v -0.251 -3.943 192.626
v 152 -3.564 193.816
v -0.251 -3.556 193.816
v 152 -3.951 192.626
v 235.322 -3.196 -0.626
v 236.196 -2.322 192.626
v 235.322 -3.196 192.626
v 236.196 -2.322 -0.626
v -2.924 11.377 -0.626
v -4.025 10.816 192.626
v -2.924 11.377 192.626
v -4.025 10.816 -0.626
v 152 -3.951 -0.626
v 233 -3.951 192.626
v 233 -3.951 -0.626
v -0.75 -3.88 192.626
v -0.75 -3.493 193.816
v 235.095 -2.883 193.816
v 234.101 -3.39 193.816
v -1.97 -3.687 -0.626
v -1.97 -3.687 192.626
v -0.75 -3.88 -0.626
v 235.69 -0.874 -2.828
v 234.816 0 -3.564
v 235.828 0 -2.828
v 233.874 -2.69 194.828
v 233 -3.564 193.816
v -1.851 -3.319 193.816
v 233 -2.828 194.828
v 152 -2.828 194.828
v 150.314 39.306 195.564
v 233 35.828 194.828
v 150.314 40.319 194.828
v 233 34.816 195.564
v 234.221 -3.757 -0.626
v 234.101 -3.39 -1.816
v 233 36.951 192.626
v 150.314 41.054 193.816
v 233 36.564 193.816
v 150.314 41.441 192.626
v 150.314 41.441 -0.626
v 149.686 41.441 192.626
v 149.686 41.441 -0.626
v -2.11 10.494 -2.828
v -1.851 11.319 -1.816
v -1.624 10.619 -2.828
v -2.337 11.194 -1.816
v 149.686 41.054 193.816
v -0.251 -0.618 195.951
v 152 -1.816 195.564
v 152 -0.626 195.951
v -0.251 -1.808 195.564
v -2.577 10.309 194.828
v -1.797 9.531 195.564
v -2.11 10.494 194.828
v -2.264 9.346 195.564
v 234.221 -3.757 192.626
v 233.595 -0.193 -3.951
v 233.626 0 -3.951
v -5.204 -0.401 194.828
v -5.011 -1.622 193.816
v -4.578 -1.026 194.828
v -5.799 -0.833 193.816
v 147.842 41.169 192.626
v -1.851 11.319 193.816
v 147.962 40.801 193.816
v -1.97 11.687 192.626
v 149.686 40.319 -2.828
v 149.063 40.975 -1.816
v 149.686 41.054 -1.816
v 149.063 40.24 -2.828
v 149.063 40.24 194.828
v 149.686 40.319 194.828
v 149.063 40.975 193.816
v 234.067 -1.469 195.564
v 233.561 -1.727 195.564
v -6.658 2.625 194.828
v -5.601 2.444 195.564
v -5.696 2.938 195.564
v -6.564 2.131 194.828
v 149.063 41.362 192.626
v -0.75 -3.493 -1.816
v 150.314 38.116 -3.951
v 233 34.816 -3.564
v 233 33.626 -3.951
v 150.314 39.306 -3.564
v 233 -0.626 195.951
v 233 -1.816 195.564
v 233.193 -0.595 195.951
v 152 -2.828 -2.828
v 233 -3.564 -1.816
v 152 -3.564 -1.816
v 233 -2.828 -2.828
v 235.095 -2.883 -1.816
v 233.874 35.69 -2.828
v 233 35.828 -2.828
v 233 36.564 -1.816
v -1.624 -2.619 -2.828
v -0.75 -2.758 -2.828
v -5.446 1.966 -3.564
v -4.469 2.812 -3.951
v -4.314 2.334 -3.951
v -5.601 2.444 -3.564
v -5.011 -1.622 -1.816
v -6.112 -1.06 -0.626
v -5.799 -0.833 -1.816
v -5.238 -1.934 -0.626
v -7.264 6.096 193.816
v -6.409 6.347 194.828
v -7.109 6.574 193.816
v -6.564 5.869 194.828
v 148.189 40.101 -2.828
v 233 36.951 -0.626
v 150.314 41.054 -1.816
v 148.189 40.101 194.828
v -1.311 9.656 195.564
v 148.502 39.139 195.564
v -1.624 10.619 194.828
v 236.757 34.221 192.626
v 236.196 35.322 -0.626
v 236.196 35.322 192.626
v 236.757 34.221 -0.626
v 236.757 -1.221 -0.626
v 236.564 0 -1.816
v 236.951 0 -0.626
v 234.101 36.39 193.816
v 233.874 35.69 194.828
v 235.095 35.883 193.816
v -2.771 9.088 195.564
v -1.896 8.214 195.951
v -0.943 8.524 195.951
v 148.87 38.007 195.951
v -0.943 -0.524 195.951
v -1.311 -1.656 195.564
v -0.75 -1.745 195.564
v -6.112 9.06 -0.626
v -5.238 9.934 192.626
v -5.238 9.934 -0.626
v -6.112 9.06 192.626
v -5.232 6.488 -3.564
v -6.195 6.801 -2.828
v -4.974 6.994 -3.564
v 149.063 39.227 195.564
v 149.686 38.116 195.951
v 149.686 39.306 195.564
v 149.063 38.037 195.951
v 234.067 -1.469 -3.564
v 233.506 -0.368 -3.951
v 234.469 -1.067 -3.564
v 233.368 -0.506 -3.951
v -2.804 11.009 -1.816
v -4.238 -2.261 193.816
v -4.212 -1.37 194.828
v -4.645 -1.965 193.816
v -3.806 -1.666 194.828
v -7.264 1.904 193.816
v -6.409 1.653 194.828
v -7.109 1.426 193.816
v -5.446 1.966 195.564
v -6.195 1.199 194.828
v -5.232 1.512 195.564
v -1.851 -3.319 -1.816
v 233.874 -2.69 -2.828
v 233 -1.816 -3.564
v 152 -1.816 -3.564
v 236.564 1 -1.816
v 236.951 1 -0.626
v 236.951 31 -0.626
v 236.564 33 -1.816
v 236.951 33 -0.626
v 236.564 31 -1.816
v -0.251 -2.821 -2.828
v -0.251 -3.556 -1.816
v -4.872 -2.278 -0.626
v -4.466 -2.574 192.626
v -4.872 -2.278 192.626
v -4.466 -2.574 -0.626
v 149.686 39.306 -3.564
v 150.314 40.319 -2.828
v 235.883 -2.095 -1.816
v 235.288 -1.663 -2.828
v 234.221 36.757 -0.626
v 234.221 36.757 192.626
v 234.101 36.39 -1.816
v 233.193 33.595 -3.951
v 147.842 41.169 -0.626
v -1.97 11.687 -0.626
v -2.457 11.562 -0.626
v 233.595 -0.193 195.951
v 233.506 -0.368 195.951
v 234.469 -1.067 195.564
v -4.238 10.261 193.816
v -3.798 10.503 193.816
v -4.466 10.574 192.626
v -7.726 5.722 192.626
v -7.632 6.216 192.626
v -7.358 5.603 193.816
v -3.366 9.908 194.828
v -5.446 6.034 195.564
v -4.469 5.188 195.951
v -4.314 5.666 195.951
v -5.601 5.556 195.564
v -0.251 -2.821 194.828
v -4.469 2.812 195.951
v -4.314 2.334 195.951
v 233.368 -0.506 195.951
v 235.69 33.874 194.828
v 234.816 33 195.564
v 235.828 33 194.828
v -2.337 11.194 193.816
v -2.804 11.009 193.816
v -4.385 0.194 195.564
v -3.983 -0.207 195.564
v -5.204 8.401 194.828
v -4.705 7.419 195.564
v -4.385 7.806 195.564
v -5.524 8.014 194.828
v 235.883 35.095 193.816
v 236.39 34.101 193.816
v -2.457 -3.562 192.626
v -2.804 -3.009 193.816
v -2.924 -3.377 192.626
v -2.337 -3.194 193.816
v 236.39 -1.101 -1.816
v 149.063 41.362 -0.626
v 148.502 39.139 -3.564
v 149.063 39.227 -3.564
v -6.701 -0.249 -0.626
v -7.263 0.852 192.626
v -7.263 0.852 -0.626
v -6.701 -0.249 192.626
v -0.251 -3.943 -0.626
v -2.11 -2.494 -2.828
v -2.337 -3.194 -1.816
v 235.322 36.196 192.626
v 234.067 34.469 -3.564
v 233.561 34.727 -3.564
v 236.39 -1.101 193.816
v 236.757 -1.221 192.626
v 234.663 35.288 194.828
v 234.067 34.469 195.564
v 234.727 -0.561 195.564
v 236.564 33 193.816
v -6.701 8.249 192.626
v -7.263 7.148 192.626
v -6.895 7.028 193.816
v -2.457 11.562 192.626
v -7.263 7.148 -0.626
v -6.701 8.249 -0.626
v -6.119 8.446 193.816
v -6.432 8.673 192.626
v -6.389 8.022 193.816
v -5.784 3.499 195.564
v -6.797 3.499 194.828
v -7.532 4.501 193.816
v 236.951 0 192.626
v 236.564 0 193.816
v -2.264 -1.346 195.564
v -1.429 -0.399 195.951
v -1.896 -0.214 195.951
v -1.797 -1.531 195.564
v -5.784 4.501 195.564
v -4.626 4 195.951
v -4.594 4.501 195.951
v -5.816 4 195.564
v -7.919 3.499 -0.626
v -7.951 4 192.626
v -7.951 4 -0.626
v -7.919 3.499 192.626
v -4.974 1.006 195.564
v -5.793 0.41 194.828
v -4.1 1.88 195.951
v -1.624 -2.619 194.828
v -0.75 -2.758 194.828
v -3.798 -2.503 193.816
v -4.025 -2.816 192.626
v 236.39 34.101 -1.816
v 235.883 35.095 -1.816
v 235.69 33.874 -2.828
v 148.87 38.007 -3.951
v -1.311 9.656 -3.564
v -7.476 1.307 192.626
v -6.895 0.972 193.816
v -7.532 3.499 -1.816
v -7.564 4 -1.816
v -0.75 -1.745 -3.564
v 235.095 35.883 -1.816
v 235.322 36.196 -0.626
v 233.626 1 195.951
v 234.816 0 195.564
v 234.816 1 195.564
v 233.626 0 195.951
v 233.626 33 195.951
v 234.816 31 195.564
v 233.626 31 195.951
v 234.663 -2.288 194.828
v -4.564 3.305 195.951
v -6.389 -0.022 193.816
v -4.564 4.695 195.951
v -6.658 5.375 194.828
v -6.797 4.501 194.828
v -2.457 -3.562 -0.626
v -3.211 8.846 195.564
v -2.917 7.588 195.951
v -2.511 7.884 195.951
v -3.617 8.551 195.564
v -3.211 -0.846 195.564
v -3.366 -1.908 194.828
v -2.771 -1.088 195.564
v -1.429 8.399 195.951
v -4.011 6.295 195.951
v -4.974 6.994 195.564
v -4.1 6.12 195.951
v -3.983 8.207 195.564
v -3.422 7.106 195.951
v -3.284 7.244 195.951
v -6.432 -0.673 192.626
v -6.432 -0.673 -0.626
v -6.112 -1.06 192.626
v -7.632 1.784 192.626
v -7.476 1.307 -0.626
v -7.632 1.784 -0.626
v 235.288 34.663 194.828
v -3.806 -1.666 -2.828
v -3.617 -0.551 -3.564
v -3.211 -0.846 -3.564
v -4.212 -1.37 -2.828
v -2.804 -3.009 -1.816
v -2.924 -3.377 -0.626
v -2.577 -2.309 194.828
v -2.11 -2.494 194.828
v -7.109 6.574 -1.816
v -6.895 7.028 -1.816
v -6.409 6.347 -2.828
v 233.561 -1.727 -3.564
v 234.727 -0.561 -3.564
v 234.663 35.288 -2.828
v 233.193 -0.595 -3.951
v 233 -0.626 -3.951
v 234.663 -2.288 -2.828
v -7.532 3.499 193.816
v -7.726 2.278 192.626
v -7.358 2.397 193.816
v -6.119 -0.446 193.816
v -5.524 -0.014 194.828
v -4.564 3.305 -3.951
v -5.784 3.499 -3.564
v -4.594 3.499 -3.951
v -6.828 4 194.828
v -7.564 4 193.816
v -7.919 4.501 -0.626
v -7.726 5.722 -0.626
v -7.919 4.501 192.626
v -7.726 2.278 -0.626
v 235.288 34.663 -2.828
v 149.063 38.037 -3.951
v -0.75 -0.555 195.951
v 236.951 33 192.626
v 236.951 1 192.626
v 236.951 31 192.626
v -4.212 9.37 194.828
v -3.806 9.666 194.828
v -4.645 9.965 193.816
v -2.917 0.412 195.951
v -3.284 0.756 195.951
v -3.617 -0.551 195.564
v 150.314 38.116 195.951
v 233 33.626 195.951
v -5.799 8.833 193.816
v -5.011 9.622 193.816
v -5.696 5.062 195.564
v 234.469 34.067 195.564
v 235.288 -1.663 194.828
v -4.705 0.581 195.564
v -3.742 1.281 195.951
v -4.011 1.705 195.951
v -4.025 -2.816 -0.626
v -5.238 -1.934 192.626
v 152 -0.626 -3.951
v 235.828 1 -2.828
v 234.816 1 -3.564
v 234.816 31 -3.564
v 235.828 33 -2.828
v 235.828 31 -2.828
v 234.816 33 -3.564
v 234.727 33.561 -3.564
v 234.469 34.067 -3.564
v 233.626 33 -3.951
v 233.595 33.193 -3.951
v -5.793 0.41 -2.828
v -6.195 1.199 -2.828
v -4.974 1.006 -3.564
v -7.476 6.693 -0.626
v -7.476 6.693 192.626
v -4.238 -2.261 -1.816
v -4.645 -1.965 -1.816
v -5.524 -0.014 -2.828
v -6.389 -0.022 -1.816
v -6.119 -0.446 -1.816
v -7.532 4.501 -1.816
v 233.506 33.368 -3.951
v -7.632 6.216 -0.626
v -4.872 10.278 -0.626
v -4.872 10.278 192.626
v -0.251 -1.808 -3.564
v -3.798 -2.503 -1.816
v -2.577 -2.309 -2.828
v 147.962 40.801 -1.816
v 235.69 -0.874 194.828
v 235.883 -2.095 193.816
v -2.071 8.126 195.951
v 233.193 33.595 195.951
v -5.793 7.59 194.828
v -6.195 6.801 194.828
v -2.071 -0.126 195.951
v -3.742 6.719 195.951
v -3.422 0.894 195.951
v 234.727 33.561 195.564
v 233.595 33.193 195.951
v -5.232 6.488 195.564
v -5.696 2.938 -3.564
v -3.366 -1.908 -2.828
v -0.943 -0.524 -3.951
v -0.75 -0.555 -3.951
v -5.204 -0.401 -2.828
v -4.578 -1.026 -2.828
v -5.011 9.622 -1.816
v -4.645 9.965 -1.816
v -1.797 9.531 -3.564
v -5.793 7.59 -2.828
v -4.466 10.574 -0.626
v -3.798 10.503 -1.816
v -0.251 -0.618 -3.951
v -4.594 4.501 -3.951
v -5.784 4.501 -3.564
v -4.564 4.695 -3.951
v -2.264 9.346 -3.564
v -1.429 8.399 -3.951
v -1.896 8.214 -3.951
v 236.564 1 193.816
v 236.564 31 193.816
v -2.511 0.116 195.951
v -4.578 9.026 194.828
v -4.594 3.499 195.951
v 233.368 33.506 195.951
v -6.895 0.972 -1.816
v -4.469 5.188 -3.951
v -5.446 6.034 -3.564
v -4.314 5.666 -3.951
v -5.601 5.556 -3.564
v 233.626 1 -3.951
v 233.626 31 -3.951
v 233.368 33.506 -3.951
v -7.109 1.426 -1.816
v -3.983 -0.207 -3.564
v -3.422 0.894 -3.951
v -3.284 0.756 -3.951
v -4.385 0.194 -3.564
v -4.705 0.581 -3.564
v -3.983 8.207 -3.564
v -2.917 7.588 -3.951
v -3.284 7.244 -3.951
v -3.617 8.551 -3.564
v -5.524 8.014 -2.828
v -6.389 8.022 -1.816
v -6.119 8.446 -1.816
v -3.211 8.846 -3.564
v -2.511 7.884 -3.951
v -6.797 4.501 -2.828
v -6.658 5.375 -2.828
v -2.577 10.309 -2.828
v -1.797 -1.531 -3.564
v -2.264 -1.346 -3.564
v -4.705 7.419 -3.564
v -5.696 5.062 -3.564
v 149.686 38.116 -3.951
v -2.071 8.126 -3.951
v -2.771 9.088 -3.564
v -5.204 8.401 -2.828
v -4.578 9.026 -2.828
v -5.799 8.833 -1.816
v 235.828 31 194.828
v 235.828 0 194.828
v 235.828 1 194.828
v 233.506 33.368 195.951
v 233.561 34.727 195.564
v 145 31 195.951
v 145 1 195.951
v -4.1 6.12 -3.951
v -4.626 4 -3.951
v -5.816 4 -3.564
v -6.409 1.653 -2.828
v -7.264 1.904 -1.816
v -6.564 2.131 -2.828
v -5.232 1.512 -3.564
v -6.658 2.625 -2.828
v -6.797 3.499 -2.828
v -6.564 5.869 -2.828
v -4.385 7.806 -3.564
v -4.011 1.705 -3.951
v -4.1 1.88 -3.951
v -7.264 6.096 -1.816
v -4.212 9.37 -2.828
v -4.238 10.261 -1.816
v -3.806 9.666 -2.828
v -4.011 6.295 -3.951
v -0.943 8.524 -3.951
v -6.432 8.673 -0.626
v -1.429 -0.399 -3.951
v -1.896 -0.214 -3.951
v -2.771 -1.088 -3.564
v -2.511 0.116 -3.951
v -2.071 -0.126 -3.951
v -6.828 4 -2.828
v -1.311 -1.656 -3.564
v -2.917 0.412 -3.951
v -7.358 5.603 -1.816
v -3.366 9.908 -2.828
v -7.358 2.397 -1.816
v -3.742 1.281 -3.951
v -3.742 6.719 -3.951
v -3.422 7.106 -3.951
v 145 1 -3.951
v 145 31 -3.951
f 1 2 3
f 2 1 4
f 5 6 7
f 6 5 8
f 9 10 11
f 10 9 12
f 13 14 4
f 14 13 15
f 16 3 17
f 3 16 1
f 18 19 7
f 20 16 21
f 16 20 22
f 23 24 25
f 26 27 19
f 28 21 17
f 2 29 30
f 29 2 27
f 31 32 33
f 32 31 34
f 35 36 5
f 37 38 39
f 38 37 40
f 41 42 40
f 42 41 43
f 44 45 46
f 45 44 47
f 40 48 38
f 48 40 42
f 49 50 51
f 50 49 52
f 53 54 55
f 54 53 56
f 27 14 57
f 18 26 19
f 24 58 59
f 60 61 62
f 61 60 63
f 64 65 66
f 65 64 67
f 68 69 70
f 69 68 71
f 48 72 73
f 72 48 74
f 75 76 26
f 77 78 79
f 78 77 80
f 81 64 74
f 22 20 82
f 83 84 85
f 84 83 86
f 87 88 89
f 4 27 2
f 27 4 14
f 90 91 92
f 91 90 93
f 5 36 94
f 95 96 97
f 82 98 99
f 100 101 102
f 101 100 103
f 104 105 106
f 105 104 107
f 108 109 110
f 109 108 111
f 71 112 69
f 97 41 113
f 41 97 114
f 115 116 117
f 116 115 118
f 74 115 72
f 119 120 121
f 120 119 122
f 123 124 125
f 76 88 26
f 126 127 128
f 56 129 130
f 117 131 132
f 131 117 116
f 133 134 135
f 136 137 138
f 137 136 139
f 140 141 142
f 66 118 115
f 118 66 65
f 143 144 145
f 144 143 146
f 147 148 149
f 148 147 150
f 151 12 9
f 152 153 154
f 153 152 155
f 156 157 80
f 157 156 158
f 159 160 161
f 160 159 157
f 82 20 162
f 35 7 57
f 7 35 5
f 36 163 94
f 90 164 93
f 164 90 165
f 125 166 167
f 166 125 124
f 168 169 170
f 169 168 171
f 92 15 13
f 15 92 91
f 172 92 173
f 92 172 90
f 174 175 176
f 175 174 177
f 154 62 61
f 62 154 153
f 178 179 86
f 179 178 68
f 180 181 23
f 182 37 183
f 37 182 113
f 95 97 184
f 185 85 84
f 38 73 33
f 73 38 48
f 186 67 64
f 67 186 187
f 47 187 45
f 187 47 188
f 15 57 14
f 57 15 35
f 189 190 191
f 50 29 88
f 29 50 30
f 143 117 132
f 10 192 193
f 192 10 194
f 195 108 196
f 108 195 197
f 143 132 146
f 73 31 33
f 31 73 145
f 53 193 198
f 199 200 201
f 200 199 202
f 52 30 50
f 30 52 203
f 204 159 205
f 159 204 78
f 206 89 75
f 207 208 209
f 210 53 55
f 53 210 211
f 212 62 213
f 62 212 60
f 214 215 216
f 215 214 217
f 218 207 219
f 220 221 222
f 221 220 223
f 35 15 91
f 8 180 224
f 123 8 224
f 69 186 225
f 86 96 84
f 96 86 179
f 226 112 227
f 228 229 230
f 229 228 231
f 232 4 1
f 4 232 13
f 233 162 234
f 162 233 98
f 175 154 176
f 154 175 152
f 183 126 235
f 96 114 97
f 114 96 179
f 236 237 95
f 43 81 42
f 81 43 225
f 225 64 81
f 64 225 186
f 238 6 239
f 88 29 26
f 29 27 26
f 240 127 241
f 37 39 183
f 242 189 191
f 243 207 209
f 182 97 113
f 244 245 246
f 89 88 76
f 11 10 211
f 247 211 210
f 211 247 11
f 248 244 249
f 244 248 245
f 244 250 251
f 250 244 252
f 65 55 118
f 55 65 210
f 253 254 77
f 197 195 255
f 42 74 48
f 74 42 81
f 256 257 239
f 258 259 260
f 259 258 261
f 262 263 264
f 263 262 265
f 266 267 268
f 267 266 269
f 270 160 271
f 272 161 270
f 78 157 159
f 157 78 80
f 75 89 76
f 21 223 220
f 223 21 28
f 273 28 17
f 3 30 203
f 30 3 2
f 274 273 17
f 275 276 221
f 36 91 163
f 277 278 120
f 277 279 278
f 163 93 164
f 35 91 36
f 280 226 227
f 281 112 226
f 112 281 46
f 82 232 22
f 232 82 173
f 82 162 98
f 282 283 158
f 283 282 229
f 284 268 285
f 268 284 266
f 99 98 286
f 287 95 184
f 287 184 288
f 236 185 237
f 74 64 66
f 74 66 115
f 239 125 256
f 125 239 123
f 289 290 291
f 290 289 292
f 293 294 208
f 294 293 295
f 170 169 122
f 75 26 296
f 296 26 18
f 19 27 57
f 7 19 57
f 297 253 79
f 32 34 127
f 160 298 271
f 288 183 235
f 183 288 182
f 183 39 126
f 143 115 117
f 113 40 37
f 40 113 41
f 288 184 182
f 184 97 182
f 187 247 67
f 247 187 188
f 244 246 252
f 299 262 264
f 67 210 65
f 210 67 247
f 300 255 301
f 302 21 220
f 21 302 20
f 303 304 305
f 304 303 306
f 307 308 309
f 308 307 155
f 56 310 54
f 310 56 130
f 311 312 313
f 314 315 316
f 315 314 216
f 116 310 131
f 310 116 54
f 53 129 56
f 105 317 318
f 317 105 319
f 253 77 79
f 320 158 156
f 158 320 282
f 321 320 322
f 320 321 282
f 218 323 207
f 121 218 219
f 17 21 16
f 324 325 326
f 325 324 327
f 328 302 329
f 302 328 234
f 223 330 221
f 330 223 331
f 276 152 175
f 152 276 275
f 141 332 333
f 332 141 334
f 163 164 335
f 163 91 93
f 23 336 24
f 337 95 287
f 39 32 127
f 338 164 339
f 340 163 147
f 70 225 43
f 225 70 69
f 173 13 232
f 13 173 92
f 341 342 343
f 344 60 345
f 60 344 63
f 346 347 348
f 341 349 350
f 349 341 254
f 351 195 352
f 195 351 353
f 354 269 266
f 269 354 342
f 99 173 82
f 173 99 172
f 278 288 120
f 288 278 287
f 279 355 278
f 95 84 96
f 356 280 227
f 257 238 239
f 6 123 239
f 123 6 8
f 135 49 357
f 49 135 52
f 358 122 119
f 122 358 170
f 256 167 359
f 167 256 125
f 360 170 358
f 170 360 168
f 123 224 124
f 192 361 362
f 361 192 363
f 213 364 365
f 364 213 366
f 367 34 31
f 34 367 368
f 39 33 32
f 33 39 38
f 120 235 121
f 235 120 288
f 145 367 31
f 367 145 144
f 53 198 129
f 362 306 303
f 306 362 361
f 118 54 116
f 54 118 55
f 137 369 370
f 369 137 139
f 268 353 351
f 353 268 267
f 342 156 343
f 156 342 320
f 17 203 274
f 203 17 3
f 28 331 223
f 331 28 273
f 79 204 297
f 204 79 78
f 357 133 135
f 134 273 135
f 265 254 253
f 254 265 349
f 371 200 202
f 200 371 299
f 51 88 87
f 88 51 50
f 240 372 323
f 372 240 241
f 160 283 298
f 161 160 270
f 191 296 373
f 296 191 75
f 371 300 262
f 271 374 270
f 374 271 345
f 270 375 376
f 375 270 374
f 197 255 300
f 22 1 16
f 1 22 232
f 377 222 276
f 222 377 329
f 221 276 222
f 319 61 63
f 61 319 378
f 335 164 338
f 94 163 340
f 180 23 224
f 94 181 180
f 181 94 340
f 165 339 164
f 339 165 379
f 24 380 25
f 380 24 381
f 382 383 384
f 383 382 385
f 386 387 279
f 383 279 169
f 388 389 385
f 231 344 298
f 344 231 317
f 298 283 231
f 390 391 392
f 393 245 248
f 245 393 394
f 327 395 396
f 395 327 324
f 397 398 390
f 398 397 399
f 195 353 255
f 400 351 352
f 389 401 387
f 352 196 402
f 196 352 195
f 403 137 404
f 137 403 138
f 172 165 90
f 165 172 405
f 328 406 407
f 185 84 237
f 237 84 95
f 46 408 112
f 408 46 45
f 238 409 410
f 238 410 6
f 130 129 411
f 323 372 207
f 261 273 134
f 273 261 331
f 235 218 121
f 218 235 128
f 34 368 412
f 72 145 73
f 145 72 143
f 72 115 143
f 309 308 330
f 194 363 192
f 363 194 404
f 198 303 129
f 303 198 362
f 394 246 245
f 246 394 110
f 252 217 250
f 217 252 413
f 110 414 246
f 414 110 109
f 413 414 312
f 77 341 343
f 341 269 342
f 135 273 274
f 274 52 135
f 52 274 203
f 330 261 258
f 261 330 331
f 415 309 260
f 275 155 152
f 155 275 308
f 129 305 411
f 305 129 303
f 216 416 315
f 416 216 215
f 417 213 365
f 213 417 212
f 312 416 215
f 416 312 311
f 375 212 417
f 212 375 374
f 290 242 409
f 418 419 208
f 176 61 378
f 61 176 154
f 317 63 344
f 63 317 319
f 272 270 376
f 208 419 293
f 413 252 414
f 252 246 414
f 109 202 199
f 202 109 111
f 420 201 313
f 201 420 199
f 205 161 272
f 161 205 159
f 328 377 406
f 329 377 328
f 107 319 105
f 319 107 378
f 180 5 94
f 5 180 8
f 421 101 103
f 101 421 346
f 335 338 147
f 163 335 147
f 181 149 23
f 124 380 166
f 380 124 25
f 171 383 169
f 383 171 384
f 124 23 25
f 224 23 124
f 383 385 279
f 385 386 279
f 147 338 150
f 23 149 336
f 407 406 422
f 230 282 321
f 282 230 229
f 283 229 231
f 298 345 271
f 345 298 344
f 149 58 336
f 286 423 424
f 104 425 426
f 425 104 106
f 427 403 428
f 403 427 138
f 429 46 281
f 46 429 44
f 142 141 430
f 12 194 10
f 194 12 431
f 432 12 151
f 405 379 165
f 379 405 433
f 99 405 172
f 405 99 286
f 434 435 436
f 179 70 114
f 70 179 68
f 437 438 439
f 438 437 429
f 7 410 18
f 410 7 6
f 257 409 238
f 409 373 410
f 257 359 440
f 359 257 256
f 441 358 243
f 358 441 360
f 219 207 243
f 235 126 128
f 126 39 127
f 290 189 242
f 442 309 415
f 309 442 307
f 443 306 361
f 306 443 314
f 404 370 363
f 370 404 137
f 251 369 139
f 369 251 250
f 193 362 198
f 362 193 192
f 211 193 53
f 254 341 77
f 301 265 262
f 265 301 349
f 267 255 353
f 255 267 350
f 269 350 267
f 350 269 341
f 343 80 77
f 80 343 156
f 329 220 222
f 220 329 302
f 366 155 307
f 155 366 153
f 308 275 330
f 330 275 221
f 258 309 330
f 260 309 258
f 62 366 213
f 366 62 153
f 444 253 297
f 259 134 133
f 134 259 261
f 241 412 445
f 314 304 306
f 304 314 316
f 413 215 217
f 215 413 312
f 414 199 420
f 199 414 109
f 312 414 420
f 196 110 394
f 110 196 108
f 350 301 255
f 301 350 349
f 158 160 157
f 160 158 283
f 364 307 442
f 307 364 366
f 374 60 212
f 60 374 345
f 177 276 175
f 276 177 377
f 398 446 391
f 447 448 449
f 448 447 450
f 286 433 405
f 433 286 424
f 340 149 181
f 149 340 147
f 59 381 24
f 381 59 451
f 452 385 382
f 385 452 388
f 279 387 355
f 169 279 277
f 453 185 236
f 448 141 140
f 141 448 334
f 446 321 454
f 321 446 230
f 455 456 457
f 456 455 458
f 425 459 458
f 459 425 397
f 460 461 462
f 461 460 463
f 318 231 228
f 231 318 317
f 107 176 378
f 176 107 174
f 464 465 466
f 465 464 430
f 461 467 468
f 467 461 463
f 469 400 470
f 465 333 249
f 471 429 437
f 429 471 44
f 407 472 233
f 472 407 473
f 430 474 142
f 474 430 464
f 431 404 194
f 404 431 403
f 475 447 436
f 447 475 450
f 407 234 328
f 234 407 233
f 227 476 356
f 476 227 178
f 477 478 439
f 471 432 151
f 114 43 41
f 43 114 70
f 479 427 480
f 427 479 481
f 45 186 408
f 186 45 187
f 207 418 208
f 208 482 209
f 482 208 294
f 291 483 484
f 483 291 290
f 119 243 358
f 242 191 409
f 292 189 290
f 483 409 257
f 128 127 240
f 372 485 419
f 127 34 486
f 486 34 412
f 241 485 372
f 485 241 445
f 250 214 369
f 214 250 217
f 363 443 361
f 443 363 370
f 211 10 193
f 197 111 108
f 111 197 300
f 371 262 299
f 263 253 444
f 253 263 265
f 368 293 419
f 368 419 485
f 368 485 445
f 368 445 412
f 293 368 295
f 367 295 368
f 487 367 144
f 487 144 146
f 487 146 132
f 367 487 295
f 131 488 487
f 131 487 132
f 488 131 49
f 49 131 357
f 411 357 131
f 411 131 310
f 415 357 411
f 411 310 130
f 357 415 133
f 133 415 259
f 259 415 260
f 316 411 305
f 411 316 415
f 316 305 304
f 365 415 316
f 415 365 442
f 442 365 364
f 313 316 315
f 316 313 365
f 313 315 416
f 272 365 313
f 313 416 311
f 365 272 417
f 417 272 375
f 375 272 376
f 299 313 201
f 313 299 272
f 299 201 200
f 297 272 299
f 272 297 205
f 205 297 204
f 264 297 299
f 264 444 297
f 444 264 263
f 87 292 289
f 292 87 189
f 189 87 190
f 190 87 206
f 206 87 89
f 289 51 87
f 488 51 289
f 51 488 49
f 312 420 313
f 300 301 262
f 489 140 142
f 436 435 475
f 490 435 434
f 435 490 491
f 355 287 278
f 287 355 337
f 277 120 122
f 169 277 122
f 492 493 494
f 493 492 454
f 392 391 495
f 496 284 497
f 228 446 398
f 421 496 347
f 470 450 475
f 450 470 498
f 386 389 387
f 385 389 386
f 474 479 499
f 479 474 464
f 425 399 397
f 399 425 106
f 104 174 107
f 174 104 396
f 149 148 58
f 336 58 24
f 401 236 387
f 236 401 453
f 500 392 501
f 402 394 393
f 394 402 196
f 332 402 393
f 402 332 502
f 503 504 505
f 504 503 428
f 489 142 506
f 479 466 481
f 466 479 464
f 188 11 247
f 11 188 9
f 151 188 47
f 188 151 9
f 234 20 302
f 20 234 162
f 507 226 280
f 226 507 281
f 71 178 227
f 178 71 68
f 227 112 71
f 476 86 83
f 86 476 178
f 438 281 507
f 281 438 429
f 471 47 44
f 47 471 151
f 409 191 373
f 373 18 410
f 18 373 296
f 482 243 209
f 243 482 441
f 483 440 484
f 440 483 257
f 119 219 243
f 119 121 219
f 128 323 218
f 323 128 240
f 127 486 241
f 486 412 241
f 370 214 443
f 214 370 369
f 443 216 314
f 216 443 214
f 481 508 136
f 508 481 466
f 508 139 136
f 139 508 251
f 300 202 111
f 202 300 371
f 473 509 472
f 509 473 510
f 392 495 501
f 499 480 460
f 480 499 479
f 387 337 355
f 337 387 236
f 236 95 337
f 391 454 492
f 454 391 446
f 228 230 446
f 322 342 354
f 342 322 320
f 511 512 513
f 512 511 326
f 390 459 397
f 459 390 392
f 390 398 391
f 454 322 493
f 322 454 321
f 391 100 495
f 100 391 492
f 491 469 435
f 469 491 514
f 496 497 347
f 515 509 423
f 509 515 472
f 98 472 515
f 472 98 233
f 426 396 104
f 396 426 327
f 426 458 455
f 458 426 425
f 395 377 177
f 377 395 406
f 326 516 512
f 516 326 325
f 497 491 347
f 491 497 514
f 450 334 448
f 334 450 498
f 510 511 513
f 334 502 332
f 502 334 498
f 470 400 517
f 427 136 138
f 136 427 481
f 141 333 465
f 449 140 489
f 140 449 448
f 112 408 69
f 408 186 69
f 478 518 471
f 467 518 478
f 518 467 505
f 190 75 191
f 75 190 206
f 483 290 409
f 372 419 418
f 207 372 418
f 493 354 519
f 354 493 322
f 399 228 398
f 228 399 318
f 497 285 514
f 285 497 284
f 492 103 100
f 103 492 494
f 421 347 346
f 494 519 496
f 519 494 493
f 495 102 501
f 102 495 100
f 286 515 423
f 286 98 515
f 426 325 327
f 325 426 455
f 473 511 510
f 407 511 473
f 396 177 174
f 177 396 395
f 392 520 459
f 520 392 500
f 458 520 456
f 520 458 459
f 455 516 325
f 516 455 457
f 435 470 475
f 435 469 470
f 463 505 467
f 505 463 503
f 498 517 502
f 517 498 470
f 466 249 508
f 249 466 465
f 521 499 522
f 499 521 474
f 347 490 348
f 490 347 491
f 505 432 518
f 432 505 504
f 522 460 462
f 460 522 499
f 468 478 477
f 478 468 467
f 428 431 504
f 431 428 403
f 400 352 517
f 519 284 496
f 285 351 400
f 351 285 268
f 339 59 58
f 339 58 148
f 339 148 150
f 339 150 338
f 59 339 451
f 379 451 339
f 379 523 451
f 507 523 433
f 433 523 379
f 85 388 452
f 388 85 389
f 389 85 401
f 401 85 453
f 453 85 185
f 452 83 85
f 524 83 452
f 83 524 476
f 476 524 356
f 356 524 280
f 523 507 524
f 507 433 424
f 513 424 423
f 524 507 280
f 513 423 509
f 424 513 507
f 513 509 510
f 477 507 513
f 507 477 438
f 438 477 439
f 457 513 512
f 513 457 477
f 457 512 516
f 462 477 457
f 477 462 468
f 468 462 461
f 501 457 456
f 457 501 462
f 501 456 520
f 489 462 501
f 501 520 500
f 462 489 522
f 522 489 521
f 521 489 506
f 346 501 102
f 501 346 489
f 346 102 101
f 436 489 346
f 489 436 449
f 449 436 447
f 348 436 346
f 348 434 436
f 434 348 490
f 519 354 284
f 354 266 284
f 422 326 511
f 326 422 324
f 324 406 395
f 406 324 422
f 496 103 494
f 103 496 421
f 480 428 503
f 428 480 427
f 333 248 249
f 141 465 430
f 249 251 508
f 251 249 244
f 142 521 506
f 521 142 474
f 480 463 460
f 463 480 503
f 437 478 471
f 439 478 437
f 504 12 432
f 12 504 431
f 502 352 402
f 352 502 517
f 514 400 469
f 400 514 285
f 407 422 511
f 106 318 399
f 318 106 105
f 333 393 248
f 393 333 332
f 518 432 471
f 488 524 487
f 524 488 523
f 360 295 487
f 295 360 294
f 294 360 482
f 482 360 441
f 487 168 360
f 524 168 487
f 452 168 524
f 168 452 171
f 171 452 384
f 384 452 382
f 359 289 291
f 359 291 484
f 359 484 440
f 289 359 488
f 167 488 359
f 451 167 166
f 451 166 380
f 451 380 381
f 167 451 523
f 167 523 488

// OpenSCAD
/////////////////////////////// Reposa antebrazos///////////////////////////////


////////////////// Creado por Luis Rodríguez para la Fundación ONCE - 2019 /////////////////



//Este software se distribuye bajo licencia Creative Commons - Attribution - NonCommercial - ShareAlike license.
//https://creativecommons.org/licenses/by-nc-sa/4.0/
//Este software no tiene ningún tipo de garantía y el usuario será el único responsable de su uso



//////////Este reposa antebrazos está pensado para dar un soporte adicional a los antebrazos de aquellas personas que por uno u otro motivo no tengan posibilidad de mantenerlos cuando trabajan sobre una mesa//////////


///////////////Todos los parámetros están medidos en milímetros///////////////


//////////////////////////////////////////////////////////////////////////////////////////////////////////////

////////////////////Parámetros definibles por el usuario////////////////////



/*[Parámetros de la mesa]*/

//Grosor de la mesa 
GrueMesa = 30;           //[10:0.1:45]

//¿El canto de la mesa es plano o redondeado?
Borde_Mesa = "Plano";      //[Plano:Plano, Redondeado:Redondeado]



/*[Parámetros del reposa antebrazos]*/

//Si se desea que el reposa antebrazos dé un mayor acceso al cuerpo
Escotadura = "No";      //[Derecha:Con Escotadura Derecha, Izquierda:Con Escotadura Izquierda, No:Sin escotadura]

//Profundidad total del reposa antebrazos
ProfTotal = 245;          //[190:5:300]

//Parte voladiza del reposa antebrazos (donde realmente se hace el apoyo)
ProfVol = 160;           //[100:5:210]

//Anchura del reposa antebrazos
AnchoTotal = 200;        //[150:1:250]

//Grosor sobre la mesa
GrueSoMesa = 5;           //[4:0.5:10]

//Grosor mínimo de la parte inferior  
GrosMinInf = 6;          //[4:0.5:10]

//Grosor máximo de la parte inferior 
GrosMaxInf = 10;         //[6:0.5:30]



/*[Hidden]*/

Suavizado = 4;

RadCuerpo = 250;

RadioBase = (GrosMaxInf)/2;

Calc = RadCuerpo-(AnchoTotal-((RadCuerpo+AnchoTotal/2+AnchoTotal/8)-RadCuerpo));

Desplaz = ProfVol-RadioBase*3-(sqrt((RadCuerpo*RadCuerpo)-(Calc*Calc)));


///////////////////////////////////Módulos///////////////////////////////////




module Suavizado1() {
    rotate([90,90,0])
    translate([-RadCuerpo-AnchoTotal/2-AnchoTotal/8,Desplaz,-GrueSoMesa-GrueMesa-GrosMinInf-RadioBase+1])
        cylinder(GrueSoMesa+GrueMesa+GrosMinInf+RadioBase, r=RadCuerpo,$fn=160);
                    }




module Suavizado2() {
    rotate([90,90,0])
    translate([RadCuerpo-AnchoTotal/2+AnchoTotal/6,Desplaz,-GrueSoMesa-GrueMesa-GrosMinInf-RadioBase+1])
        cylinder(GrueSoMesa+GrueMesa+GrosMinInf+RadioBase, r=RadCuerpo,$fn=160);
                    }






module Base() {
    difference() {
        hull() {
            translate([ProfVol-Suavizado*2,0,0])
                cube([ProfTotal-ProfVol-Suavizado,GrueSoMesa+GrueMesa+GrosMinInf-Suavizado*2,AnchoTotal-Suavizado*2]);
            translate([0,Suavizado,0])
                cylinder(AnchoTotal-Suavizado*2, r=Suavizado,$fn=50);
            translate([ProfVol-RadioBase*2,GrueMesa+RadioBase/2,0])
                cylinder(AnchoTotal-Suavizado*2, r=RadioBase,$fn=50);
               }
        
    
        if(Escotadura=="Iquierda")
            Suavizado2();
               
        if(Escotadura=="Derecha")
            Suavizado1();
                

                  }
              }


module Principal() {
minkowski(){
Base();
sphere(r=Suavizado,$fn=20);
}
}

if (Borde_Mesa=="Redondeado")
difference(){
Principal(); 
translate([ProfVol,GrueSoMesa-Suavizado,-Suavizado]) 
            cube([ProfTotal,GrueMesa,AnchoTotal+Suavizado*2]);
translate([ProfVol,GrueMesa/2+GrueSoMesa-Suavizado,-Suavizado])
            cylinder(AnchoTotal+Suavizado*2,d=GrueMesa,$fn=50);
}

if (Borde_Mesa=="Plano")
difference(){
Principal(); 
translate([ProfVol-GrueMesa/2,GrueSoMesa-Suavizado,-Suavizado]) 
            cube([ProfTotal,GrueMesa,AnchoTotal+Suavizado*2]);
}
